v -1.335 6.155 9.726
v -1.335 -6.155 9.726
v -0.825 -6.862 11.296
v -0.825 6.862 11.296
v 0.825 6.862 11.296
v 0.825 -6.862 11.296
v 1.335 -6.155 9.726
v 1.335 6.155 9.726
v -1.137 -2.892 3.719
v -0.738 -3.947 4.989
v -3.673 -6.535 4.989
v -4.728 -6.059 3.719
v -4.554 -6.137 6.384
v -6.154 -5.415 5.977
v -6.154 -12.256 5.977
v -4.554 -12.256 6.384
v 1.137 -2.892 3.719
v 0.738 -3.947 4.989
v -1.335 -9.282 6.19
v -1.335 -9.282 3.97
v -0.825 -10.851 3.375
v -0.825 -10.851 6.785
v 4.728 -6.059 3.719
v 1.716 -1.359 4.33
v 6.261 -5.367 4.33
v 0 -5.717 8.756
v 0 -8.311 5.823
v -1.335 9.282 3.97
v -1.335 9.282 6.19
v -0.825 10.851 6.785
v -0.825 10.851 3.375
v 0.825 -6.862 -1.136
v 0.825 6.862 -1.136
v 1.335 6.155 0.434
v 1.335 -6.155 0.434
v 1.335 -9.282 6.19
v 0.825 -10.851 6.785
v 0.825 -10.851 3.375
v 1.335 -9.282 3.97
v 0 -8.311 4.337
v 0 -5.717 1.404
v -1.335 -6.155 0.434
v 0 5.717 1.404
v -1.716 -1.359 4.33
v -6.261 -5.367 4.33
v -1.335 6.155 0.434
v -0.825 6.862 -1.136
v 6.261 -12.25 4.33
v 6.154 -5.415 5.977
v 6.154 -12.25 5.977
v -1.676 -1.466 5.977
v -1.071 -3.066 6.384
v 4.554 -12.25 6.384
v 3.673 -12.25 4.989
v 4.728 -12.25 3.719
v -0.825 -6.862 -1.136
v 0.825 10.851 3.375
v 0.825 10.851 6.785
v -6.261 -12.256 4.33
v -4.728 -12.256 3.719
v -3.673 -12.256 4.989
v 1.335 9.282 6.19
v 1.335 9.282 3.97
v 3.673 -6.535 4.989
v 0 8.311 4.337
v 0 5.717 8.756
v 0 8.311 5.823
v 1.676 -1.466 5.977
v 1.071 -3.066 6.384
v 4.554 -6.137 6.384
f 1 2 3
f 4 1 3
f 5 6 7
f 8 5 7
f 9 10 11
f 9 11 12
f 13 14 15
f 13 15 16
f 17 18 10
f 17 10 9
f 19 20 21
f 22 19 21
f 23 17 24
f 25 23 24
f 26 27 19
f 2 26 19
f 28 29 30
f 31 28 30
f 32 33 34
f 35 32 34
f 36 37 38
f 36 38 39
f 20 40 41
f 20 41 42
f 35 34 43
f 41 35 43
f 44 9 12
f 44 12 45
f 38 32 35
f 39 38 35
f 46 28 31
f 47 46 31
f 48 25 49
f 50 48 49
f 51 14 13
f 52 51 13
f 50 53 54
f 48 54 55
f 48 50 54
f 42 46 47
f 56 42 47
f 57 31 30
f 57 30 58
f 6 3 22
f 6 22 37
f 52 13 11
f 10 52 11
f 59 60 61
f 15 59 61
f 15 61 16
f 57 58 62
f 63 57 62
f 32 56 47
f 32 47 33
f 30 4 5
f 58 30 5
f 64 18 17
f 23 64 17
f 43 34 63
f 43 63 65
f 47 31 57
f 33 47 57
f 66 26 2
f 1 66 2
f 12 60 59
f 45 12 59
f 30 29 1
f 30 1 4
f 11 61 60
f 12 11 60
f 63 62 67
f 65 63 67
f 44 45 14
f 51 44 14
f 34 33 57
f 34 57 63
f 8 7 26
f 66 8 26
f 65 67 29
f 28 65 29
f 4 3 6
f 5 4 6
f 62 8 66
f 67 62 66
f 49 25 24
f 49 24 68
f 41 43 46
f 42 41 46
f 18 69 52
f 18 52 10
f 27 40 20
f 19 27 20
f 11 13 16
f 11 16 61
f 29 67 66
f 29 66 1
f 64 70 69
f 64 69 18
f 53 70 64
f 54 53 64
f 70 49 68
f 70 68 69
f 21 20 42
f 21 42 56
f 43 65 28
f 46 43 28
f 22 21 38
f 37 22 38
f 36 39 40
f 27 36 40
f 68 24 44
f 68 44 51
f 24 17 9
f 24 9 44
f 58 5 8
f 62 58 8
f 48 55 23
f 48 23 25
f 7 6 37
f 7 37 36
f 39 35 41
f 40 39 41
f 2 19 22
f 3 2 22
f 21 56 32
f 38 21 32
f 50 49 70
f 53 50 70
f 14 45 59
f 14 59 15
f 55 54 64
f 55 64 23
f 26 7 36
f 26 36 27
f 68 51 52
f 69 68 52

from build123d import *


with BuildPart() as f2:
    # F2: sweep along a path in F1
    with BuildLine(Plane.YZ) as f2_path:
        Line((-9.7155, 6.3547654803), (-9.7155, 3.8052345197))
        Line((-9.7155, 3.8052345197), (-6.35, 0))
        Line((-6.35, 0), (6.35, 0))
        Line((6.35, 0), (9.7155, 3.8052345197))
        Line((9.7155, 3.8052345197), (9.7155, 6.3547654803))
        Line((9.7155, 6.3547654803), (6.35, 10.16))
        Line((6.35, 10.16), (-6.35, 10.16))
        Line((-6.35, 10.16), (-9.7155, 6.3547654803))
    # F0 (on Front) → F2 (sweep)
    with BuildSketch(Plane.XZ):
        Polygon((0, 1.4040774674), (-1.3353570248, 0.4338837989), (-0.8252960284, -1.1359225326), (0.8252960284, -1.1359225326), (1.3353570248, 0.4338837989), align=None)
    sweep(path=f2_path.line, transition=Transition.RIGHT)


with BuildPart() as f6:
    # F6: sweep along a path in F4
    with BuildLine(Plane.XY.offset(5.08)) as f6_path:
        Line((0, -2.54), (-1.27, -2.54))
        Line((-1.27, -2.54), (-5.08, -5.9001041651))
        Line((-5.08, -5.9001041651), (-5.08, -12.2555))
    # F5 (on Right) → F6 (sweep)
    with BuildSketch(Plane.YZ):
        Polygon((-3.0658560668, 6.3843532686), (-3.9472605593, 4.9887959395), (-2.8923756347, 3.7192795221), (-1.3590164046, 4.330232556), (-1.466233208, 5.9773387138), align=None)
    sweep(path=f6_path.line, transition=Transition.RIGHT)

    # F7: sweep along a path in F4
    with BuildLine(Plane.XY.offset(5.08)) as f7_path:
        Line((0, -2.54), (1.27, -2.54))
        Line((1.27, -2.54), (5.08, -5.9001041651))
        Line((5.08, -5.9001041651), (5.08, -12.2501041651))
    # F5 (on Right) → F7 (sweep)
    with BuildSketch(Plane.YZ):
        Polygon((-3.0658560668, 6.3843532686), (-3.9472605593, 4.9887959395), (-2.8923756347, 3.7192795221), (-1.3590164046, 4.330232556), (-1.466233208, 5.9773387138), align=None)
    sweep(path=f7_path.line, transition=Transition.RIGHT)


solid = Compound([f2.part, f6.part])
